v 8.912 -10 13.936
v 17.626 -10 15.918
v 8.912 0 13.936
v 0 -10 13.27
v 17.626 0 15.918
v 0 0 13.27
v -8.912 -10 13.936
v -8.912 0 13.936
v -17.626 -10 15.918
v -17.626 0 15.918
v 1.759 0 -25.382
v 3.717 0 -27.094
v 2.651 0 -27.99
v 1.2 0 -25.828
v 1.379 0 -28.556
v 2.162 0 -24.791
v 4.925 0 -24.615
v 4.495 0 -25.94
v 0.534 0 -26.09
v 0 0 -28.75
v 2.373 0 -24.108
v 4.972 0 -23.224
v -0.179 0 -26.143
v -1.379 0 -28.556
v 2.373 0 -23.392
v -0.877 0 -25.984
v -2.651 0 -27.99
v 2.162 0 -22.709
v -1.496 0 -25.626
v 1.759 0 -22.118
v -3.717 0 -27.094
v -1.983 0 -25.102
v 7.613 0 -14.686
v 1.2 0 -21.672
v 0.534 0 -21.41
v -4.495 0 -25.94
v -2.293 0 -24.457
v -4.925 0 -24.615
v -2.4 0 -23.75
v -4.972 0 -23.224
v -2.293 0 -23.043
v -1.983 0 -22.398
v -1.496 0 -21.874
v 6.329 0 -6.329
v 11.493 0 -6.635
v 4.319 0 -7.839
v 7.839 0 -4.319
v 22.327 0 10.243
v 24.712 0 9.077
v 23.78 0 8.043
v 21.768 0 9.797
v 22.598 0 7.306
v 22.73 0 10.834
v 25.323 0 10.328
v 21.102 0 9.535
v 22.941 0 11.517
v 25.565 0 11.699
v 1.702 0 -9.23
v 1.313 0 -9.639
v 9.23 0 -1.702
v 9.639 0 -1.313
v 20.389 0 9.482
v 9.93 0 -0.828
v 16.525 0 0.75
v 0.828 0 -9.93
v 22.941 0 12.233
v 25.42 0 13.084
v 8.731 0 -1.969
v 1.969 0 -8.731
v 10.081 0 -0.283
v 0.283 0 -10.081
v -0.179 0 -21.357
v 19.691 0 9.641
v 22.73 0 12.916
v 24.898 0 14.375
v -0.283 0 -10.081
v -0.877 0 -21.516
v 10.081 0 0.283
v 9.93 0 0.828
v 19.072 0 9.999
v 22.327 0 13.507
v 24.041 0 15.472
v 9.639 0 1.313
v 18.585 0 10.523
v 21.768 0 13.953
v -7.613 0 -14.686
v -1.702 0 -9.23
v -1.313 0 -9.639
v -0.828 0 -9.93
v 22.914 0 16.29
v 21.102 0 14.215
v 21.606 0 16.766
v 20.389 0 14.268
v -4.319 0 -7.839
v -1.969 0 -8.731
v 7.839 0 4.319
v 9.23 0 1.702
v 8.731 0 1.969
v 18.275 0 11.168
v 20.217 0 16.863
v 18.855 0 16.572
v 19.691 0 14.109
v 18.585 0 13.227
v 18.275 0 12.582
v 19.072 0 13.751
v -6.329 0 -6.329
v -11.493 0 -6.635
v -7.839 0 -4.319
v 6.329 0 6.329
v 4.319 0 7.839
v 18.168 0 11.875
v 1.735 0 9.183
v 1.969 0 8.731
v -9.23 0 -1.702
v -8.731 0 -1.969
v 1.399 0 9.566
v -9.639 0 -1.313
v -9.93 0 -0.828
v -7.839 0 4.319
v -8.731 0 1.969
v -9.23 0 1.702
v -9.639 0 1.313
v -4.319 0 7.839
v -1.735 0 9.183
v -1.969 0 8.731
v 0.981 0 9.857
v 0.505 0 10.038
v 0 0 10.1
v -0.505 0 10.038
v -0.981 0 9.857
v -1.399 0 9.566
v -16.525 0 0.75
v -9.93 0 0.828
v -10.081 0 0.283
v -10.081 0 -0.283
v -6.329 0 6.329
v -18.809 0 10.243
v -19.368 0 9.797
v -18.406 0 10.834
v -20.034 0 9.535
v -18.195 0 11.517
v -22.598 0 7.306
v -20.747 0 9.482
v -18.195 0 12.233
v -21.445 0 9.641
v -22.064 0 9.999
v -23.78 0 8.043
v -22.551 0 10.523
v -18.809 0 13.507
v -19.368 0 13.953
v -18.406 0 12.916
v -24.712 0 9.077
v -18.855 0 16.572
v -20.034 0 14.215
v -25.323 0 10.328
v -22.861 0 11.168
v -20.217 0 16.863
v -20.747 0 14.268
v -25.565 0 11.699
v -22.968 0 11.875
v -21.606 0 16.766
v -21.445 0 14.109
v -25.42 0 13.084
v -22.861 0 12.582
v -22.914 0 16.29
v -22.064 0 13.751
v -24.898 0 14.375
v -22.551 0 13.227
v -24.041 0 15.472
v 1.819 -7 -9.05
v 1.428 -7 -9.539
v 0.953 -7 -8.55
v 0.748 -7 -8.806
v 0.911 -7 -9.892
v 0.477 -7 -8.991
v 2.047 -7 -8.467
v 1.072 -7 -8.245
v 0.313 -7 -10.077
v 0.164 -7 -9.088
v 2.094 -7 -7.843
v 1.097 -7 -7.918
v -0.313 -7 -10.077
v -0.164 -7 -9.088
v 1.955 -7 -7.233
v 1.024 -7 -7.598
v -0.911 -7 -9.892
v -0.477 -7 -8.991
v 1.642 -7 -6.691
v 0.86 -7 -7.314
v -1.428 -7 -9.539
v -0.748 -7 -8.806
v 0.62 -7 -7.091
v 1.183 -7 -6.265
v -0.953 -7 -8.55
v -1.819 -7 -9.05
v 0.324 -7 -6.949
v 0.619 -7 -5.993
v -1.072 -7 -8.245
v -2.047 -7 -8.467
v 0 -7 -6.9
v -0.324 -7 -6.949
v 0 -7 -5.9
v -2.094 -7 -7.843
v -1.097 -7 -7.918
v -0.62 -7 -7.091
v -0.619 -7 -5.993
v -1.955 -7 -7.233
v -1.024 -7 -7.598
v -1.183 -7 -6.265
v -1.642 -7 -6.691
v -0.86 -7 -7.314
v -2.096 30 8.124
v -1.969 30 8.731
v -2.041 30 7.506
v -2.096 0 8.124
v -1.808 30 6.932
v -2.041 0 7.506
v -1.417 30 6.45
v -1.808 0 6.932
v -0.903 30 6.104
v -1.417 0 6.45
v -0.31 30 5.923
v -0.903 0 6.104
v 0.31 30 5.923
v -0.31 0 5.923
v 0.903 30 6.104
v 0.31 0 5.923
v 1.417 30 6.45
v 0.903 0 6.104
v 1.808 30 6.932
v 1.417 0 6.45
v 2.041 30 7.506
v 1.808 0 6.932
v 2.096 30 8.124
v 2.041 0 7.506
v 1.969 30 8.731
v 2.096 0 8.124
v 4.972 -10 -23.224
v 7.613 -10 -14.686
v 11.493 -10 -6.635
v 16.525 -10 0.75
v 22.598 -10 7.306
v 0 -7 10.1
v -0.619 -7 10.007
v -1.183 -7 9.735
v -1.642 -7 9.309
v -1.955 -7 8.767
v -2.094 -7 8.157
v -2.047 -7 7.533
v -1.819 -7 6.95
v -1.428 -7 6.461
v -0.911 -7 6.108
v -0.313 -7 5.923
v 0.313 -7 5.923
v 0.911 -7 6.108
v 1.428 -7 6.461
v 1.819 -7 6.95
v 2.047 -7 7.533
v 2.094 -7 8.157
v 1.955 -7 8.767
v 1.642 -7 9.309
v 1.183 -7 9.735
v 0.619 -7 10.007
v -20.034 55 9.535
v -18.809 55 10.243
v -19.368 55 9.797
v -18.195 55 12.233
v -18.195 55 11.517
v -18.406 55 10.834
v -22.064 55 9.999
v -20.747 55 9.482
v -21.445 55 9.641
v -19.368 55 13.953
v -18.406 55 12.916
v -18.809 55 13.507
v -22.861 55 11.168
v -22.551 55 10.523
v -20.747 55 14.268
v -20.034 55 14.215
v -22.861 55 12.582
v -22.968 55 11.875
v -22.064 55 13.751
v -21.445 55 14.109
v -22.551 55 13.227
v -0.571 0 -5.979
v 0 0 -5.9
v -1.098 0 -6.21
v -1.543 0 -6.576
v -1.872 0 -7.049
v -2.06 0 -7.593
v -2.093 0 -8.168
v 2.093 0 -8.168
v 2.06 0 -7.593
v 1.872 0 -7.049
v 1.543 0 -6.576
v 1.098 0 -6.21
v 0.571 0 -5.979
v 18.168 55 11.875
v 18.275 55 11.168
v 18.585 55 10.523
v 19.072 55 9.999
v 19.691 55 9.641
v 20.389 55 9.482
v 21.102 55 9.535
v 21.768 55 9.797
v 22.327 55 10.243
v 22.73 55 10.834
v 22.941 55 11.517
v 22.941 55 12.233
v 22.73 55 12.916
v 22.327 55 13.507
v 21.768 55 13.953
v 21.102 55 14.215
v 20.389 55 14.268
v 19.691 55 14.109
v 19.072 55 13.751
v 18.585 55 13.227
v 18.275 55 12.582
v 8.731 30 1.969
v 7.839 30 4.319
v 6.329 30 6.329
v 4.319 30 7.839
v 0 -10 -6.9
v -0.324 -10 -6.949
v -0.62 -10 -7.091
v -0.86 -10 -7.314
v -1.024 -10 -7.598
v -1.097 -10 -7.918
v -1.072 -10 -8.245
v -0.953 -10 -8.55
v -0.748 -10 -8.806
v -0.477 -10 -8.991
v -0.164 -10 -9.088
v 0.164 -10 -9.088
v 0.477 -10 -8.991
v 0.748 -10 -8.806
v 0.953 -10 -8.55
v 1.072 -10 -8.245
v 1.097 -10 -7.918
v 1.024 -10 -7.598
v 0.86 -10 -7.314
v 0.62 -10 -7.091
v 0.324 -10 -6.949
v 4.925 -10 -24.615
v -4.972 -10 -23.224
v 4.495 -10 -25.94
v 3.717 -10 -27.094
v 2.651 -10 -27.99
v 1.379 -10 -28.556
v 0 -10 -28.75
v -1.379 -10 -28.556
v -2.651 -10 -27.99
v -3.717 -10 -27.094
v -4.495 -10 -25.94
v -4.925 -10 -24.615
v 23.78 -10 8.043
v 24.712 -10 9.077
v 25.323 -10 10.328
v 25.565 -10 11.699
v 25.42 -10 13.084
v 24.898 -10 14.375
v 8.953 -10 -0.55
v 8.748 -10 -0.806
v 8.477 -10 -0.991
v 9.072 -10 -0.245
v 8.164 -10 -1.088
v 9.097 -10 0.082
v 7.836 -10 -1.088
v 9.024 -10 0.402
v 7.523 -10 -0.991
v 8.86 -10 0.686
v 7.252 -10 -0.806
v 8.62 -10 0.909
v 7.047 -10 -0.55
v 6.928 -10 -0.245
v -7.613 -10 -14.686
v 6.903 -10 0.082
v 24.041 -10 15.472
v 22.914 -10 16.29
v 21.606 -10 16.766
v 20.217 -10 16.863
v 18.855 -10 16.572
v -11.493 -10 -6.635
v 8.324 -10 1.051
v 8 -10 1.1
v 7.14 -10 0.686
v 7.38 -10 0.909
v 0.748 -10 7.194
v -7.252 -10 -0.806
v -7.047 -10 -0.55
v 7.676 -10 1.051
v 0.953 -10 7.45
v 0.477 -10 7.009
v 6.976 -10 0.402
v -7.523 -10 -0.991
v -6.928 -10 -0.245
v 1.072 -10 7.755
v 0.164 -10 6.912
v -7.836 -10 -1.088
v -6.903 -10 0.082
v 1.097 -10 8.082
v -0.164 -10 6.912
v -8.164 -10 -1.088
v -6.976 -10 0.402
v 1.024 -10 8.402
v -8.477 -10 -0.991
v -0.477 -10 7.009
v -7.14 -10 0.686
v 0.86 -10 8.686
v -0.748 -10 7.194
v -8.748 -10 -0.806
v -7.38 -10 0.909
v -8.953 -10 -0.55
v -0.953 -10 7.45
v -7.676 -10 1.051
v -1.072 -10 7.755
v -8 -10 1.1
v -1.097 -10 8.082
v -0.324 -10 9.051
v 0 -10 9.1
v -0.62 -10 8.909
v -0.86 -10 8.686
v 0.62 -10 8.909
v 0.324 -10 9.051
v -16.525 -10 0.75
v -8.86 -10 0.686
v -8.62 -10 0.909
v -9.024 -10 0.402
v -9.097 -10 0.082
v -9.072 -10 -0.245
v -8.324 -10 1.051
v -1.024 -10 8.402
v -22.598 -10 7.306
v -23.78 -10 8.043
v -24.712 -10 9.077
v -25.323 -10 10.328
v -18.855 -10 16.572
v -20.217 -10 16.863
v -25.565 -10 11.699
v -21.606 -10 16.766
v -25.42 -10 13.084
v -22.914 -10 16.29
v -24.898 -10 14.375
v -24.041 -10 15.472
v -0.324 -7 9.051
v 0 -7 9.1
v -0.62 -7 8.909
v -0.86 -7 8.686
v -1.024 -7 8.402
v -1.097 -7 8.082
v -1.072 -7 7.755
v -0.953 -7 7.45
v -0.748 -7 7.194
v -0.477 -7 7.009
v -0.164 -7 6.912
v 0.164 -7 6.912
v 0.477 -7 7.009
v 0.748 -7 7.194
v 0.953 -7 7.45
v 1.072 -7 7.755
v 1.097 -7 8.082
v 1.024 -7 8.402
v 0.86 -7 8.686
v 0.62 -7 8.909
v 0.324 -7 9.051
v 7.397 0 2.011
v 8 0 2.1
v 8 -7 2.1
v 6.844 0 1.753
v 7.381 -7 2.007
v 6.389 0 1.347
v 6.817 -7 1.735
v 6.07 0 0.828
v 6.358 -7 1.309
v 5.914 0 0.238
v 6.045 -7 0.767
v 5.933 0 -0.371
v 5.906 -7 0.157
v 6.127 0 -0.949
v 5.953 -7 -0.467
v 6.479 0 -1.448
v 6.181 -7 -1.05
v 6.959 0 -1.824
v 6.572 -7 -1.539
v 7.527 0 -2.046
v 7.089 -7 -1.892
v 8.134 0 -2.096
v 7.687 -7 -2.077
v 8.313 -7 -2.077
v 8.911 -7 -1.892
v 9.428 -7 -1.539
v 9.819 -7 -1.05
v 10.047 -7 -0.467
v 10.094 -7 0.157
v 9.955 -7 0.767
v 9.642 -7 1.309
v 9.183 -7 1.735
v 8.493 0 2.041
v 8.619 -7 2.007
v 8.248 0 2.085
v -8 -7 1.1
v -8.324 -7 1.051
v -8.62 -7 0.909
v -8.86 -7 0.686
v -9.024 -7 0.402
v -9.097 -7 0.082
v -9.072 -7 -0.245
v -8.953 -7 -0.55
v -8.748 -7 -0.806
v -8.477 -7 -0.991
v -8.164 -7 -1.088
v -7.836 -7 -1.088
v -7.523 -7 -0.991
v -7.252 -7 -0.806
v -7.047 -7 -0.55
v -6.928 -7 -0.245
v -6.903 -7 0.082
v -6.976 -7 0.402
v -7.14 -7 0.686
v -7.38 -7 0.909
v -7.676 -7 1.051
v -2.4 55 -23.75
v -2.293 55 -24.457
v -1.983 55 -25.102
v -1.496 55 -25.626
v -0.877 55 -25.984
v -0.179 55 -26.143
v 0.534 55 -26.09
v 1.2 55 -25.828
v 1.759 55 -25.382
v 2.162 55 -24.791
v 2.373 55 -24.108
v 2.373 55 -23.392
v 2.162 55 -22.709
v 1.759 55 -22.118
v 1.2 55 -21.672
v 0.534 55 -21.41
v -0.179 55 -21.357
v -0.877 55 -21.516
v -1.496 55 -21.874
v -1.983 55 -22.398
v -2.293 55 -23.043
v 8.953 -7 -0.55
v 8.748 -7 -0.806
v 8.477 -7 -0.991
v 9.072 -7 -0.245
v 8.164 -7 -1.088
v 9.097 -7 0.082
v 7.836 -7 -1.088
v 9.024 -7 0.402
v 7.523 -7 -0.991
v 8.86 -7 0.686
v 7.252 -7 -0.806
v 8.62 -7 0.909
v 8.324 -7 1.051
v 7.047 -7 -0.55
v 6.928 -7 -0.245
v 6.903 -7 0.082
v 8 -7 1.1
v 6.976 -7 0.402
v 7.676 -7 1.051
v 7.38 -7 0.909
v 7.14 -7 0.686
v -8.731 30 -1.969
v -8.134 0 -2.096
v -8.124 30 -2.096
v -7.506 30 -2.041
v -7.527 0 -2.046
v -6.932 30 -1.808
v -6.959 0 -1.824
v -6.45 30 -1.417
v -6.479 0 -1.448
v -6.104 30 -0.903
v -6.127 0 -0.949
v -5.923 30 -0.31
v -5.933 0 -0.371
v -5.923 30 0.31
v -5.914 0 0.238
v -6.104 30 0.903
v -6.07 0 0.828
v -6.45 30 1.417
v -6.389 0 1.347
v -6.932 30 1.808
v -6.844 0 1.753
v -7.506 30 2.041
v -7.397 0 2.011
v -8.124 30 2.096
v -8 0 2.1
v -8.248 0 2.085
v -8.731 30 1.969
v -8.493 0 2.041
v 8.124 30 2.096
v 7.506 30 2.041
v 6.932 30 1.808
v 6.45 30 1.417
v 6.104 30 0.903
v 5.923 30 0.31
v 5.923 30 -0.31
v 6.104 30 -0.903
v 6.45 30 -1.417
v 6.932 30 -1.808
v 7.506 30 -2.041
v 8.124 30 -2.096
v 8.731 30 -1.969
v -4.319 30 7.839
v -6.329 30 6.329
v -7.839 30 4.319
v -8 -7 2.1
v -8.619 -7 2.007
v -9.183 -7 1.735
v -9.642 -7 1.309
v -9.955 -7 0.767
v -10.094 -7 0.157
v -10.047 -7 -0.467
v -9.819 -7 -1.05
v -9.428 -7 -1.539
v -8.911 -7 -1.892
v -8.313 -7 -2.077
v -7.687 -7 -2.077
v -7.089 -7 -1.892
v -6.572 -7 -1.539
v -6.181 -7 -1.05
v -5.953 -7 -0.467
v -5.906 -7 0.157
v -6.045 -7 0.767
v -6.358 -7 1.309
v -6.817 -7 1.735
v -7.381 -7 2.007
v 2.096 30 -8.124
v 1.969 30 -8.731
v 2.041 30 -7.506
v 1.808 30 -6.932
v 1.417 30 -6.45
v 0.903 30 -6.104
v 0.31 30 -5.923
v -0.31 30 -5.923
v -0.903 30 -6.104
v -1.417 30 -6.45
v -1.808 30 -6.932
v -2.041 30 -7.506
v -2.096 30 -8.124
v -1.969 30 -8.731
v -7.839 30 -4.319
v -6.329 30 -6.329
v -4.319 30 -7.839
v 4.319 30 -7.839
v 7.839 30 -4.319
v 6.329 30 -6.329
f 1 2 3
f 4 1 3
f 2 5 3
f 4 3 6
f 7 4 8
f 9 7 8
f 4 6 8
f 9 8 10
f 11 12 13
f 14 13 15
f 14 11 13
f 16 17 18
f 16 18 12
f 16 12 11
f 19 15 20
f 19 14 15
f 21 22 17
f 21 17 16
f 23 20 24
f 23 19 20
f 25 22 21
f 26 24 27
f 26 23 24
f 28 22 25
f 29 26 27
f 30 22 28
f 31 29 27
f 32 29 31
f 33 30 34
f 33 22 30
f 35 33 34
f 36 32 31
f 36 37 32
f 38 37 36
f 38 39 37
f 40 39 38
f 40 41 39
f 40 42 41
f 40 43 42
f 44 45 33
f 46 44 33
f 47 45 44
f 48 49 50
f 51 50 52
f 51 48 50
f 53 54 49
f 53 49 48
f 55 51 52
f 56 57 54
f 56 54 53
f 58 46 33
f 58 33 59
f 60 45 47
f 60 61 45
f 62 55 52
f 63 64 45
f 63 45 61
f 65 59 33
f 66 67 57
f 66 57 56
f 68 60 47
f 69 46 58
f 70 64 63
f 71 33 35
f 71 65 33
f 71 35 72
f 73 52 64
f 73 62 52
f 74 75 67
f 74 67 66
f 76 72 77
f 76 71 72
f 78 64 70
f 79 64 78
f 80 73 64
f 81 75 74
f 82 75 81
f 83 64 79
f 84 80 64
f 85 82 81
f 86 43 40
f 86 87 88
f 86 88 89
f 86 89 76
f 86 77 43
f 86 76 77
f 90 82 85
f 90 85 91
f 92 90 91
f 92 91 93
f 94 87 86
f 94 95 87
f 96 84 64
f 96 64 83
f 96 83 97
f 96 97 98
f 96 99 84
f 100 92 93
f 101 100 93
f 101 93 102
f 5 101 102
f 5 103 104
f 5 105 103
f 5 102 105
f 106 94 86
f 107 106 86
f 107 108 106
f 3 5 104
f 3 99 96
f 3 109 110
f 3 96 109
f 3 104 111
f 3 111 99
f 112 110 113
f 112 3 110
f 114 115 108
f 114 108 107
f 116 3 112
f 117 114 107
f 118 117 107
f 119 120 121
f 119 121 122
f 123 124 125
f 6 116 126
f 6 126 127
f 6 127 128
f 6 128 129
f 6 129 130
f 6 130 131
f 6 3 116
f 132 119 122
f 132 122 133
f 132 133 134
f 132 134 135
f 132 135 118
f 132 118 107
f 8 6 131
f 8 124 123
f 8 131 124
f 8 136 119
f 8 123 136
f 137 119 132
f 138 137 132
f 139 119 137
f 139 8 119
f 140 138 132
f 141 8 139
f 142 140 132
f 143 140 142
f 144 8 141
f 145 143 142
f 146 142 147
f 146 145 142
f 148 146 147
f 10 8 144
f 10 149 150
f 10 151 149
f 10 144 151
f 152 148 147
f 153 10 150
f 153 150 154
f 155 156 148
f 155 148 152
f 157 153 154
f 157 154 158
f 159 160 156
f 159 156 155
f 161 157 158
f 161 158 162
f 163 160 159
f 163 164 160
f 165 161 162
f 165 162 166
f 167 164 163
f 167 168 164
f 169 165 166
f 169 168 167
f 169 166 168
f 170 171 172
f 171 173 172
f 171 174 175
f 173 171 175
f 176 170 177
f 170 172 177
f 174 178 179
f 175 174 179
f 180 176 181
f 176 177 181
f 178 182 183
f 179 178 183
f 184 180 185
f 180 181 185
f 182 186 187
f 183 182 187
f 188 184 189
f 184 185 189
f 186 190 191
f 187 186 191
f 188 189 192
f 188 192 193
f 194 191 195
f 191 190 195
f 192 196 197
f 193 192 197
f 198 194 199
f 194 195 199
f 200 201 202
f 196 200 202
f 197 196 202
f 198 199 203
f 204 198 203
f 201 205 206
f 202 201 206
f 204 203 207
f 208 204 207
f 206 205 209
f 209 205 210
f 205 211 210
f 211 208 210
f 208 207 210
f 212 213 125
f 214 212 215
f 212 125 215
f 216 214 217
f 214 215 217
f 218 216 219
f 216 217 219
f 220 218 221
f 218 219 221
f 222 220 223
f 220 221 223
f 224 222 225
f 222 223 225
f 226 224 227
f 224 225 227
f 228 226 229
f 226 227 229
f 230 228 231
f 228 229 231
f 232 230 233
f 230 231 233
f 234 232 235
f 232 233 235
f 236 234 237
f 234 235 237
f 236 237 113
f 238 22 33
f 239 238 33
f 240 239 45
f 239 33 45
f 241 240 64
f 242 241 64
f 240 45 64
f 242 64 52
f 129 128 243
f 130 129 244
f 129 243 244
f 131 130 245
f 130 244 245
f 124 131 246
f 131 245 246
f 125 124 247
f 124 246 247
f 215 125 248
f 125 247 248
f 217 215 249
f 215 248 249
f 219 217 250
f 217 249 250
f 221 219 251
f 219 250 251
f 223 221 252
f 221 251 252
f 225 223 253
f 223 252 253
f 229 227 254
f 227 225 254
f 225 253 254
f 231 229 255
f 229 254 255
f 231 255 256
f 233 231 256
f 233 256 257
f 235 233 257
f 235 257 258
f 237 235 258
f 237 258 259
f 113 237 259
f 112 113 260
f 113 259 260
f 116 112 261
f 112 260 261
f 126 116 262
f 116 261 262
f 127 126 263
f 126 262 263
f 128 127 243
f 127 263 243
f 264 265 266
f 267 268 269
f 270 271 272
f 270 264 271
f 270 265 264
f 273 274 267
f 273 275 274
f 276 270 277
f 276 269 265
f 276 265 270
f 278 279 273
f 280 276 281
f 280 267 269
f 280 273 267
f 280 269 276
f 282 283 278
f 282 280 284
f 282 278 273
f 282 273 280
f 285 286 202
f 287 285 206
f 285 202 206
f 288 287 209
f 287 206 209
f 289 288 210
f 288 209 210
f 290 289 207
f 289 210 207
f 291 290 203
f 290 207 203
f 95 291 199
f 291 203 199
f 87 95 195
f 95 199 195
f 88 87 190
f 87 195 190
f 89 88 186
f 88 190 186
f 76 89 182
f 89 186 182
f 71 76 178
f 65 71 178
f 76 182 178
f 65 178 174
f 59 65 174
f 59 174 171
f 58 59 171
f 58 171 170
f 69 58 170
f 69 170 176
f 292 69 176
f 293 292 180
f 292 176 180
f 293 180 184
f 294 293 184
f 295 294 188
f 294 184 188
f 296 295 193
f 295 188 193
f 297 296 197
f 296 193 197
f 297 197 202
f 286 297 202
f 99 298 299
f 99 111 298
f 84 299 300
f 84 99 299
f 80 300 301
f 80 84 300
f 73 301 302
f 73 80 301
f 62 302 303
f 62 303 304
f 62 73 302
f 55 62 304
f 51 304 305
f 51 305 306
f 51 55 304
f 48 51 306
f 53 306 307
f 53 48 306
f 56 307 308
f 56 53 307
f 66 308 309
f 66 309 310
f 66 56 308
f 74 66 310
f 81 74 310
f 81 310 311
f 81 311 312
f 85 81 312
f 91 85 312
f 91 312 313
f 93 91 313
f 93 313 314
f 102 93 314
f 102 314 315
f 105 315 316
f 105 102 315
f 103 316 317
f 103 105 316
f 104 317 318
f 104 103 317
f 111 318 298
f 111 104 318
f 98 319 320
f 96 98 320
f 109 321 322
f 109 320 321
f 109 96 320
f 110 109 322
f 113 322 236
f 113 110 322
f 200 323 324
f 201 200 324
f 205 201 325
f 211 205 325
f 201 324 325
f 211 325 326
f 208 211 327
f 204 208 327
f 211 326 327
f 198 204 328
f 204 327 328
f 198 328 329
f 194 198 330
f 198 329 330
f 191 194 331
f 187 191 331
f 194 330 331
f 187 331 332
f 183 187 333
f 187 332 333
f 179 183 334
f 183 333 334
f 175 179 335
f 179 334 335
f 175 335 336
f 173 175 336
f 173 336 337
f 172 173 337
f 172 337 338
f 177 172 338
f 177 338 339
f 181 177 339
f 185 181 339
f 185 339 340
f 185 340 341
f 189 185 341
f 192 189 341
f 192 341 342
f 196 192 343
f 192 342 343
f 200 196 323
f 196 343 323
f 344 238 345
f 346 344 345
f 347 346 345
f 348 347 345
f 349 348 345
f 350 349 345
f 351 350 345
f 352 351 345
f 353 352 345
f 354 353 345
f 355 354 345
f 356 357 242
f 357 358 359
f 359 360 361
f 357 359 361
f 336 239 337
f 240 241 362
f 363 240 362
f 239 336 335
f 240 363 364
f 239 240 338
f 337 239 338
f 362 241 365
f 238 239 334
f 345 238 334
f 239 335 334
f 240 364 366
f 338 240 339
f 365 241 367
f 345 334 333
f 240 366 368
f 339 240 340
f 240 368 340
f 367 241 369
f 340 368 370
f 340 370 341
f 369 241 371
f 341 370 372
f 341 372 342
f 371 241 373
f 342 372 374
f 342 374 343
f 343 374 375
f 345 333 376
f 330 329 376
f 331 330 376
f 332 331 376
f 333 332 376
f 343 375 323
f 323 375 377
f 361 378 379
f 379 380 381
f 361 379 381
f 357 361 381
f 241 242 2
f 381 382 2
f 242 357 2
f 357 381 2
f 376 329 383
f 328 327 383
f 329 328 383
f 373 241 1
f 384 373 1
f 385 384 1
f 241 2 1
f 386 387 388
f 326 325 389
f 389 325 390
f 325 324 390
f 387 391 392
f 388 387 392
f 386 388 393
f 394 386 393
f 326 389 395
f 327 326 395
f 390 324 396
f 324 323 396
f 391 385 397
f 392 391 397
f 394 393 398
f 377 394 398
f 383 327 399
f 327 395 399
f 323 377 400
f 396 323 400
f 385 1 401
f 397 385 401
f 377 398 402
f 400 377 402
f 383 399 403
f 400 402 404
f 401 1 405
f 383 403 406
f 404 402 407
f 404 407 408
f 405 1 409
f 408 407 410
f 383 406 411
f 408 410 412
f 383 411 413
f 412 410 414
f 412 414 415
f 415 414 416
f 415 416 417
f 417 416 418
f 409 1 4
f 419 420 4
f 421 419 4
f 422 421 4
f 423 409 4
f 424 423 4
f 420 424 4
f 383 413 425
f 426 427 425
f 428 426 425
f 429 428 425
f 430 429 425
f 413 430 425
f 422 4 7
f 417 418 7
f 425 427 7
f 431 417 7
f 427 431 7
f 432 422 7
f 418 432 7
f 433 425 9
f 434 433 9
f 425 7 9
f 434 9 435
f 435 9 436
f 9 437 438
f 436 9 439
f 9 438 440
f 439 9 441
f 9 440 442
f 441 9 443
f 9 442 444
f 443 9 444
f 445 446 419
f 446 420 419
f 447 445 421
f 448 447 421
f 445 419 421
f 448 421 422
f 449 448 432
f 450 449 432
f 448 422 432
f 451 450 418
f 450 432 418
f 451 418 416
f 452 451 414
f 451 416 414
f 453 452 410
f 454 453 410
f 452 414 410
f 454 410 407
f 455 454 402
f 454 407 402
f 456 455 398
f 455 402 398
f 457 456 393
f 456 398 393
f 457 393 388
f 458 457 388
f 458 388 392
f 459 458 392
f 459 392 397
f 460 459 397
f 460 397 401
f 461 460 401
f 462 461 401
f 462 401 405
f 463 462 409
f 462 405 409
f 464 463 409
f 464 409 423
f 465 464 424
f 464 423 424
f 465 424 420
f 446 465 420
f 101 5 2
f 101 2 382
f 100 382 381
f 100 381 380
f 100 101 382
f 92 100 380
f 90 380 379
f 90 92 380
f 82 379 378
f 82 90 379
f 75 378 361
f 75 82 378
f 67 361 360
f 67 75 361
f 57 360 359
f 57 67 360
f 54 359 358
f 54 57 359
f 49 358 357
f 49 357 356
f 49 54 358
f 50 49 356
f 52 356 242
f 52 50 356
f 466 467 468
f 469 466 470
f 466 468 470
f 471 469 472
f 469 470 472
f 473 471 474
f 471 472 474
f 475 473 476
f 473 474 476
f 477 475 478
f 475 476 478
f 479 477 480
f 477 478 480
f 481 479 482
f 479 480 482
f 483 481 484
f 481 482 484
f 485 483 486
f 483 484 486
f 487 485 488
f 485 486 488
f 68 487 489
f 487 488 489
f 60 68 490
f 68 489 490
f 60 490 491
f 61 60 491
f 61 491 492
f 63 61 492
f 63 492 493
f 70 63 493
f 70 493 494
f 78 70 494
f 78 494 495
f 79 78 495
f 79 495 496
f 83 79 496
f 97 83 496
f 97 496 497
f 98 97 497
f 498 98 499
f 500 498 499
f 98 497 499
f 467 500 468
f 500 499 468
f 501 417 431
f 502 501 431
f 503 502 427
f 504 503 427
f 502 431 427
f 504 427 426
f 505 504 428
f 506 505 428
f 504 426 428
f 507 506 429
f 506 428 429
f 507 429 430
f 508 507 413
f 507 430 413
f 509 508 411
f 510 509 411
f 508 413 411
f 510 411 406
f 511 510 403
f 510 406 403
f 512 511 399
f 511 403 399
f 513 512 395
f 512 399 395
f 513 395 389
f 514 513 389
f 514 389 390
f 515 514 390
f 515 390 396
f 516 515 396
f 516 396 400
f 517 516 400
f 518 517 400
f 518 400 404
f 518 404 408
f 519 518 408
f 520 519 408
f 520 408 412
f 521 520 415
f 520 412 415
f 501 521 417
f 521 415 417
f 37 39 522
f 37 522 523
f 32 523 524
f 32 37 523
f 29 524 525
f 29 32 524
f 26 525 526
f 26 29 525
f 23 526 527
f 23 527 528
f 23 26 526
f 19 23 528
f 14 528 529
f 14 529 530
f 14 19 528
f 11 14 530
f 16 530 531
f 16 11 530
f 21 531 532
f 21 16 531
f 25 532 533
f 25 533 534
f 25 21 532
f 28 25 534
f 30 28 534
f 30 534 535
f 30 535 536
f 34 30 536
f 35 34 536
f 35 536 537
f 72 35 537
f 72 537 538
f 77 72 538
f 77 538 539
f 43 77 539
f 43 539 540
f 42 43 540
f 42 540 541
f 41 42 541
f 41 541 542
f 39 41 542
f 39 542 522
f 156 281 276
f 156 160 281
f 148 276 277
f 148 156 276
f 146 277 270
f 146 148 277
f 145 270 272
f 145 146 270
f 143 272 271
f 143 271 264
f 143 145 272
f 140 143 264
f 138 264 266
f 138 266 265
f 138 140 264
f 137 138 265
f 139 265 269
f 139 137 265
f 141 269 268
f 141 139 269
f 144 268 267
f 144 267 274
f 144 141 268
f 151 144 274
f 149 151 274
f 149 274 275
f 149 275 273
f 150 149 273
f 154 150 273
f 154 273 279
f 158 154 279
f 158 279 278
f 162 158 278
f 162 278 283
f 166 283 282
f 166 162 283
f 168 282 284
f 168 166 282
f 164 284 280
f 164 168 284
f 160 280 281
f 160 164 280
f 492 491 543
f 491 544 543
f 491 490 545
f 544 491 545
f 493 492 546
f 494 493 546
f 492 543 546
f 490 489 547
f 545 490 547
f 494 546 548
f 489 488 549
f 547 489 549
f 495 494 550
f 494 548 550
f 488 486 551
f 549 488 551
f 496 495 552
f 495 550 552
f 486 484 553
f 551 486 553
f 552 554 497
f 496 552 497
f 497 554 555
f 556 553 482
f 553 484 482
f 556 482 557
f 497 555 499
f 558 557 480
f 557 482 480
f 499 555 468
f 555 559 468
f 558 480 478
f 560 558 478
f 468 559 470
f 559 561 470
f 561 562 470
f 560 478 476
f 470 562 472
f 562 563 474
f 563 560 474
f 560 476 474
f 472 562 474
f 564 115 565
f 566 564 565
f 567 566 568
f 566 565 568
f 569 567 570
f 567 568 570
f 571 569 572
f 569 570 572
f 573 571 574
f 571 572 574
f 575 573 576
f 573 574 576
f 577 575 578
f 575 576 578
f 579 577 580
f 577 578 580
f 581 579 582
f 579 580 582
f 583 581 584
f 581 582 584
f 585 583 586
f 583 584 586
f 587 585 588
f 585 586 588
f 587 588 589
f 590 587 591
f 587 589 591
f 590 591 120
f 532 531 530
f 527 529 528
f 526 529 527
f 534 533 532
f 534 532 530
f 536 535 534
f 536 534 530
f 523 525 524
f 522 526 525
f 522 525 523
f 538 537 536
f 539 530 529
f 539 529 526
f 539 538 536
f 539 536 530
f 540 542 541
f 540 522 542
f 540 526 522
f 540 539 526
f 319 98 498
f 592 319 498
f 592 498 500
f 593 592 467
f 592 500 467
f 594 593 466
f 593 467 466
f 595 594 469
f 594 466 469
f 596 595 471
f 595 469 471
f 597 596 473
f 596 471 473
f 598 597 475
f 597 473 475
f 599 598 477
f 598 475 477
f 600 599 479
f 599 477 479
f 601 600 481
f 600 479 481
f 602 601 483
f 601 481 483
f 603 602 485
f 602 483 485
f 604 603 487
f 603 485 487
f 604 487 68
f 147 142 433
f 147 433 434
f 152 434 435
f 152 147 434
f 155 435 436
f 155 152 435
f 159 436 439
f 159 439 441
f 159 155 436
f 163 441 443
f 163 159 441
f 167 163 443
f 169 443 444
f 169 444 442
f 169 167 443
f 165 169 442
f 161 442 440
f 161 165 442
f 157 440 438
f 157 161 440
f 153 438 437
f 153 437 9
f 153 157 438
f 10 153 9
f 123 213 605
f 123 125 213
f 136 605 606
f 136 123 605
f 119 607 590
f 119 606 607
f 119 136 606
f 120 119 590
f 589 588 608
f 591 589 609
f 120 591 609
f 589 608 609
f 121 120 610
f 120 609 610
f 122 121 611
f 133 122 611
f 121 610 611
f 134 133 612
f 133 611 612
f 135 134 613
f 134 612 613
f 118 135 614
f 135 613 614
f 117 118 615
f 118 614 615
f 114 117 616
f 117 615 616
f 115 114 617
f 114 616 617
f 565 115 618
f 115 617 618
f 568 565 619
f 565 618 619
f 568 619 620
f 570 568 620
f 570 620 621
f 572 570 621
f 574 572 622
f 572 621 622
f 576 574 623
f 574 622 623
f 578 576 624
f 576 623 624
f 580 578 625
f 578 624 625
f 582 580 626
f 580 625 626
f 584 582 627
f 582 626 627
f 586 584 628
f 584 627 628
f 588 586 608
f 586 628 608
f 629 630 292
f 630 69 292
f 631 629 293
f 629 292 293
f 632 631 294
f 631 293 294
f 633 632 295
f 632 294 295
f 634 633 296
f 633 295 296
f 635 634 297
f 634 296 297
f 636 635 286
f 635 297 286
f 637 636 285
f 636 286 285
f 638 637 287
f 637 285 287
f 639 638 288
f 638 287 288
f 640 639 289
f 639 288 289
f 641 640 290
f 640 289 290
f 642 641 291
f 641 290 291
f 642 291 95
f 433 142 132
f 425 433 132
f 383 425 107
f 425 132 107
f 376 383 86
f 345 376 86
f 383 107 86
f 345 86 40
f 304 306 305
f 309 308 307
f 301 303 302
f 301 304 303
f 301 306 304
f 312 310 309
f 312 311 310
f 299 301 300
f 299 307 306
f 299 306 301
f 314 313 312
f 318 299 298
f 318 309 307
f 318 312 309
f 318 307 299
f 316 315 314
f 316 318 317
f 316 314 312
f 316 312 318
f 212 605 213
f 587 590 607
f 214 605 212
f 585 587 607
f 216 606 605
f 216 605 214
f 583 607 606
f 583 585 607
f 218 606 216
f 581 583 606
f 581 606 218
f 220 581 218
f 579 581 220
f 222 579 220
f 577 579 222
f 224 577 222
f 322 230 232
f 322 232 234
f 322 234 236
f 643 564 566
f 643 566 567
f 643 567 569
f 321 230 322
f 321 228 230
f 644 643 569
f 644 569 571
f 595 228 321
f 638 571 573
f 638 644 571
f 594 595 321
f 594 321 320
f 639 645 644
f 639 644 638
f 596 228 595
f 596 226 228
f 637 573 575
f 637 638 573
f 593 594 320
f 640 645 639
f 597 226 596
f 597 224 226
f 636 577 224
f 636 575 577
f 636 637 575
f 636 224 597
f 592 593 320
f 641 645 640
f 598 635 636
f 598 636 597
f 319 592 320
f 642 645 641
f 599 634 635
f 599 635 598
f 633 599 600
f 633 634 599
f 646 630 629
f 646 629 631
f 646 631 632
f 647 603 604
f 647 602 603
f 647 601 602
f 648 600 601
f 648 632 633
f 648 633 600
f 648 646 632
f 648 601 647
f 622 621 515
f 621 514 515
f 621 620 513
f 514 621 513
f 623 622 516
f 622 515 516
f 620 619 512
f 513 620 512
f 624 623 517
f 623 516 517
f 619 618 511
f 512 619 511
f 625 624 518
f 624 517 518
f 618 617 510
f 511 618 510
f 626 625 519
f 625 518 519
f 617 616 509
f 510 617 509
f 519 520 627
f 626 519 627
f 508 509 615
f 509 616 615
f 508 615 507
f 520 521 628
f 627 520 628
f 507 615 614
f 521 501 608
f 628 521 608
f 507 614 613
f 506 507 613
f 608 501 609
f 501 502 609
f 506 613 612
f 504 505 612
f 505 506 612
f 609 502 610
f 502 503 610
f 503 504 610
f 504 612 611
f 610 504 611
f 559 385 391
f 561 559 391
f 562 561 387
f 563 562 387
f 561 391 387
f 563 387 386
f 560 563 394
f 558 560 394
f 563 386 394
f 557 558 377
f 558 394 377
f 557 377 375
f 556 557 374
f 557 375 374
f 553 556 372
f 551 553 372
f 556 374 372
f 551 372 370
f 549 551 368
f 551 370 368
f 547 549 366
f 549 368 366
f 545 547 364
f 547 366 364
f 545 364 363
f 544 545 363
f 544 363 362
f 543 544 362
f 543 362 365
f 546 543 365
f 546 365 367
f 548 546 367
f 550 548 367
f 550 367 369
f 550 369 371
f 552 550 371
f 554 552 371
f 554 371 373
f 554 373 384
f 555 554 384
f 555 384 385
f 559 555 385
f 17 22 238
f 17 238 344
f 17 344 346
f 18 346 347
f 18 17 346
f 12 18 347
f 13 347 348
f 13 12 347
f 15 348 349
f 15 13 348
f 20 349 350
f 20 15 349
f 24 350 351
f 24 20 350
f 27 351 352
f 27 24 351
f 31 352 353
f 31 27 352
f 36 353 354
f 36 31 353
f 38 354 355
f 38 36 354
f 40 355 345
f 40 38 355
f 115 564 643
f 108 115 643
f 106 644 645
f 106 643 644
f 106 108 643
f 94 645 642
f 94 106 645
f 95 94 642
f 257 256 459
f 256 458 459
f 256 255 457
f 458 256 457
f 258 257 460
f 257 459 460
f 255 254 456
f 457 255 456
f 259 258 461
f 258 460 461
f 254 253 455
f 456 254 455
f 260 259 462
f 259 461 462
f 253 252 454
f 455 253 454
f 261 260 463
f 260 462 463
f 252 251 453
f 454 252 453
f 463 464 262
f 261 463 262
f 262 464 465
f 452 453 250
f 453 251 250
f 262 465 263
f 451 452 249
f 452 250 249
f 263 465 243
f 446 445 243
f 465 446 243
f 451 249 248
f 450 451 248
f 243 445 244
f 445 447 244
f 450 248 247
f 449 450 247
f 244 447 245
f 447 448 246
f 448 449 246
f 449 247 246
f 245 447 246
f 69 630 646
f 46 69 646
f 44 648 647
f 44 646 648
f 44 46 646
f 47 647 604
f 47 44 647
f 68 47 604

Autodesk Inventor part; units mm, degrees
ref_plane "YZ Plane" through (0, 0, 0) normal (1, 0, 0) x (0, 1, 0)
ref_plane "XZ Plane" through (0, 0, 0) normal (0, 1, 0) x (-1, 0, 0)
ref_plane "XY Plane" through (0, 0, 0) normal (0, 0, 1) x (1, 0, 0)
sketch "스케치1" plane through (0, 0, 0) normal (0, 1, 0) x (-1, 0, 0)
  circle A0 centre (0, 0) radius 23.75
  circle A1 centre (0, -23.75) radius 2.4
  line L0 (0, 0) -> (0, -23.75)
  line L1 (0, 0) -> (20.5681, 11.875)
  line L2 (0, 0) -> (23.75, 0) construction
  line L3 (0, 0) -> (-20.5681, 11.875)
  line L4 (0, 0) -> (23.75, 0) construction
  circle A2 centre (20.5681, 11.875) radius 2.4
  circle A3 centre (-20.5681, 11.875) radius 2.4
  circle A4 centre (20.5681, 11.875) radius 5
  circle A5 centre (-20.5681, 11.875) radius 5
  circle A6 centre (0, -23.75) radius 5
  circle A7 centre (0, 0) radius 12
  arc A8 (-17.6262, 15.9179) -> (17.6262, 15.9179) centre (0, 73.2705) ccw
  arc A9 (22.5984, 7.3058) -> (4.9722, -23.2237) centre (63.4541, -36.6352) ccw
  arc A10 (-4.9722, -23.2237) -> (-22.5984, 7.3058) centre (-63.4541, -36.6352) ccw
  point P0 (-4.9722, -23.2237)
  dimension "d0" = 47.5
  dimension "d8" = 10
  dimension "d1" = 4.8
  dimension "d2" = 30
  dimension "d3" = 150
  dimension "d4" = 4.8
  dimension "d5" = 4.8
  dimension "d6" = 10
  dimension "d7" = 10
  dimension "d9" = 24
  dimension "d10" = 60
  dimension "d11" = 60
  dimension "d12" = 60
sketch "스케치2" plane through (0, 0, 0) normal (0, 1, 0) x (-1, 0, 0)
  point P0 (0, 0)
extrude "돌출3" add sketch "스케치1" against normal blind 5 contours A4 L1 A2 A0 | A0 A2 A4 | A9 A6 L0 A7 L1 A4 | A6 A0 A1 | A0 A1 L0 A6 | A2 L1 A0 | A0 A2 | A4 A0 A2 L1 | L1 A7 L3 A5 A8 A4 | A1 A0 | A0 L0 A1 | A6 A10 A5 L3 A7 L0 | L0 A1 A0 A6 | L1 A2 A0 | A7 L0 L1 | L1 L3 A7 | A0 A1 L0 | A7 L3 L0 | A5 L3 A3 A0 | A0 A3 A5 | A0 A3 L3 A5 | A3 L3 A0 | A0 A3 | A0 L3 A3
sketch "스케치3" plane through (0, -5, 0) normal (0, -1, 0) x (1, 0, 0)
  point P0 (0, 0)
extrude "돌출4" add sketch "스케치1" against normal blind 10 contours A4 L1 A2 A0 | A0 A2 A4 | A9 A6 L0 A7 L1 A4 | A6 A0 A1 | A0 A1 L0 A6 | A2 L1 A0 | A0 A2 | A4 A0 A2 L1 | L1 A7 L3 A5 A8 A4 | A1 A0 | A0 L0 A1 | A6 A10 A5 L3 A7 L0 | L0 A1 A0 A6 | L1 A2 A0 | A7 L0 L1 | L1 L3 A7 | A0 A1 L0 | A7 L3 L0 | A5 L3 A3 A0 | A0 A3 A5 | A0 A3 L3 A5 | A3 L3 A0 | A0 A3 | A0 L3 A3
extrude "돌출5" add sketch "스케치1" along normal blind 55 contours A2 L1 A0 | A0 A2 | A1 A0 | A0 L0 A1 | L1 A2 A0 | A0 A1 L0 | A3 L3 A0 | A0 A3 | A0 L3 A3
sketch "스케치4" plane through (0, -10, 0) normal (0, -1, 0) x (1, 0, 0)
  circle A0 centre (0, 0) radius 8
  circle A1 centre (0, 0) radius 8
  point P0 (8, 0)
  point P1 (0, -8)
  point P2 (0, 8)
  point P3 (-8, 0)
  point P4 (-8, 0)
  point P5 (-8, 0)
  point P6 (0, 8)
  point P7 (8, 0)
  point P8 (0, -8)
  dimension "d24" = 16
  dimension "d26" = 16
sketch "스케치5" plane through (0, 0, 0) normal (0, 1, 0) x (1, 0, 0)
  circle A0 centre (0, 0) radius 8
  point P0 (8, 0)
  point P1 (0, -8)
  point P2 (-8, 0)
  point P3 (0, 8)
  dimension "d27" = 16
hole "구멍1" at (0, 0, 8) at (-8, 0, 0) at (0, 0, -8) at (8, 0, 0) direction (0, -1, 0) diameter 2.2 end through all counterbore diameter 4.2 counterbore depth 7
sketch "스케치6" plane through (0, 0, 0) normal (0, 1, 0) x (1, 0, 0)
  point P0 (0, 0)
sketch "스케치7" plane through (0, 0, 0) normal (0, 1, 0) x (1, 0, 0)
  circle A0 centre (0, 0) radius 8.95
  circle A1 centre (0, 0) radius 8
  circle A2 centre (0, 8) radius 2.1
  circle A3 centre (-8, 0) radius 2.1
  circle A4 centre (0, -8) radius 2.1
  circle A5 centre (8, 0) radius 2.1
  point P0 (8.7308, 1.9687)
  point P1 (1.9687, 8.7308)
  point P2 (-1.9687, 8.7308)
  point P3 (-8.7308, 1.9687)
  point P4 (-8.7308, -1.9687)
  point P5 (-1.9687, -8.7308)
  point P6 (1.9687, -8.7308)
  point P7 (8.7308, -1.9687)
  dimension "d37" = 16
  dimension "d36" = 17.9
  dimension "d38" = 4.2
  dimension "d41" = 360
extrude "돌출6" add sketch "스케치7" along normal blind 30 contours A5 A1 A2 A0 | A0 A4 A1 A5 | A5 A1 A4 A3 A2 | A2 A1 A3 A0 | A0 A3 A1 A4
equation "\"d19\" = d7"
equation "\"TransitionRadius\" = BendRadius"
equation "\"BendRadius\" = 0.5"
properties part number "wheel_connection.0001"
